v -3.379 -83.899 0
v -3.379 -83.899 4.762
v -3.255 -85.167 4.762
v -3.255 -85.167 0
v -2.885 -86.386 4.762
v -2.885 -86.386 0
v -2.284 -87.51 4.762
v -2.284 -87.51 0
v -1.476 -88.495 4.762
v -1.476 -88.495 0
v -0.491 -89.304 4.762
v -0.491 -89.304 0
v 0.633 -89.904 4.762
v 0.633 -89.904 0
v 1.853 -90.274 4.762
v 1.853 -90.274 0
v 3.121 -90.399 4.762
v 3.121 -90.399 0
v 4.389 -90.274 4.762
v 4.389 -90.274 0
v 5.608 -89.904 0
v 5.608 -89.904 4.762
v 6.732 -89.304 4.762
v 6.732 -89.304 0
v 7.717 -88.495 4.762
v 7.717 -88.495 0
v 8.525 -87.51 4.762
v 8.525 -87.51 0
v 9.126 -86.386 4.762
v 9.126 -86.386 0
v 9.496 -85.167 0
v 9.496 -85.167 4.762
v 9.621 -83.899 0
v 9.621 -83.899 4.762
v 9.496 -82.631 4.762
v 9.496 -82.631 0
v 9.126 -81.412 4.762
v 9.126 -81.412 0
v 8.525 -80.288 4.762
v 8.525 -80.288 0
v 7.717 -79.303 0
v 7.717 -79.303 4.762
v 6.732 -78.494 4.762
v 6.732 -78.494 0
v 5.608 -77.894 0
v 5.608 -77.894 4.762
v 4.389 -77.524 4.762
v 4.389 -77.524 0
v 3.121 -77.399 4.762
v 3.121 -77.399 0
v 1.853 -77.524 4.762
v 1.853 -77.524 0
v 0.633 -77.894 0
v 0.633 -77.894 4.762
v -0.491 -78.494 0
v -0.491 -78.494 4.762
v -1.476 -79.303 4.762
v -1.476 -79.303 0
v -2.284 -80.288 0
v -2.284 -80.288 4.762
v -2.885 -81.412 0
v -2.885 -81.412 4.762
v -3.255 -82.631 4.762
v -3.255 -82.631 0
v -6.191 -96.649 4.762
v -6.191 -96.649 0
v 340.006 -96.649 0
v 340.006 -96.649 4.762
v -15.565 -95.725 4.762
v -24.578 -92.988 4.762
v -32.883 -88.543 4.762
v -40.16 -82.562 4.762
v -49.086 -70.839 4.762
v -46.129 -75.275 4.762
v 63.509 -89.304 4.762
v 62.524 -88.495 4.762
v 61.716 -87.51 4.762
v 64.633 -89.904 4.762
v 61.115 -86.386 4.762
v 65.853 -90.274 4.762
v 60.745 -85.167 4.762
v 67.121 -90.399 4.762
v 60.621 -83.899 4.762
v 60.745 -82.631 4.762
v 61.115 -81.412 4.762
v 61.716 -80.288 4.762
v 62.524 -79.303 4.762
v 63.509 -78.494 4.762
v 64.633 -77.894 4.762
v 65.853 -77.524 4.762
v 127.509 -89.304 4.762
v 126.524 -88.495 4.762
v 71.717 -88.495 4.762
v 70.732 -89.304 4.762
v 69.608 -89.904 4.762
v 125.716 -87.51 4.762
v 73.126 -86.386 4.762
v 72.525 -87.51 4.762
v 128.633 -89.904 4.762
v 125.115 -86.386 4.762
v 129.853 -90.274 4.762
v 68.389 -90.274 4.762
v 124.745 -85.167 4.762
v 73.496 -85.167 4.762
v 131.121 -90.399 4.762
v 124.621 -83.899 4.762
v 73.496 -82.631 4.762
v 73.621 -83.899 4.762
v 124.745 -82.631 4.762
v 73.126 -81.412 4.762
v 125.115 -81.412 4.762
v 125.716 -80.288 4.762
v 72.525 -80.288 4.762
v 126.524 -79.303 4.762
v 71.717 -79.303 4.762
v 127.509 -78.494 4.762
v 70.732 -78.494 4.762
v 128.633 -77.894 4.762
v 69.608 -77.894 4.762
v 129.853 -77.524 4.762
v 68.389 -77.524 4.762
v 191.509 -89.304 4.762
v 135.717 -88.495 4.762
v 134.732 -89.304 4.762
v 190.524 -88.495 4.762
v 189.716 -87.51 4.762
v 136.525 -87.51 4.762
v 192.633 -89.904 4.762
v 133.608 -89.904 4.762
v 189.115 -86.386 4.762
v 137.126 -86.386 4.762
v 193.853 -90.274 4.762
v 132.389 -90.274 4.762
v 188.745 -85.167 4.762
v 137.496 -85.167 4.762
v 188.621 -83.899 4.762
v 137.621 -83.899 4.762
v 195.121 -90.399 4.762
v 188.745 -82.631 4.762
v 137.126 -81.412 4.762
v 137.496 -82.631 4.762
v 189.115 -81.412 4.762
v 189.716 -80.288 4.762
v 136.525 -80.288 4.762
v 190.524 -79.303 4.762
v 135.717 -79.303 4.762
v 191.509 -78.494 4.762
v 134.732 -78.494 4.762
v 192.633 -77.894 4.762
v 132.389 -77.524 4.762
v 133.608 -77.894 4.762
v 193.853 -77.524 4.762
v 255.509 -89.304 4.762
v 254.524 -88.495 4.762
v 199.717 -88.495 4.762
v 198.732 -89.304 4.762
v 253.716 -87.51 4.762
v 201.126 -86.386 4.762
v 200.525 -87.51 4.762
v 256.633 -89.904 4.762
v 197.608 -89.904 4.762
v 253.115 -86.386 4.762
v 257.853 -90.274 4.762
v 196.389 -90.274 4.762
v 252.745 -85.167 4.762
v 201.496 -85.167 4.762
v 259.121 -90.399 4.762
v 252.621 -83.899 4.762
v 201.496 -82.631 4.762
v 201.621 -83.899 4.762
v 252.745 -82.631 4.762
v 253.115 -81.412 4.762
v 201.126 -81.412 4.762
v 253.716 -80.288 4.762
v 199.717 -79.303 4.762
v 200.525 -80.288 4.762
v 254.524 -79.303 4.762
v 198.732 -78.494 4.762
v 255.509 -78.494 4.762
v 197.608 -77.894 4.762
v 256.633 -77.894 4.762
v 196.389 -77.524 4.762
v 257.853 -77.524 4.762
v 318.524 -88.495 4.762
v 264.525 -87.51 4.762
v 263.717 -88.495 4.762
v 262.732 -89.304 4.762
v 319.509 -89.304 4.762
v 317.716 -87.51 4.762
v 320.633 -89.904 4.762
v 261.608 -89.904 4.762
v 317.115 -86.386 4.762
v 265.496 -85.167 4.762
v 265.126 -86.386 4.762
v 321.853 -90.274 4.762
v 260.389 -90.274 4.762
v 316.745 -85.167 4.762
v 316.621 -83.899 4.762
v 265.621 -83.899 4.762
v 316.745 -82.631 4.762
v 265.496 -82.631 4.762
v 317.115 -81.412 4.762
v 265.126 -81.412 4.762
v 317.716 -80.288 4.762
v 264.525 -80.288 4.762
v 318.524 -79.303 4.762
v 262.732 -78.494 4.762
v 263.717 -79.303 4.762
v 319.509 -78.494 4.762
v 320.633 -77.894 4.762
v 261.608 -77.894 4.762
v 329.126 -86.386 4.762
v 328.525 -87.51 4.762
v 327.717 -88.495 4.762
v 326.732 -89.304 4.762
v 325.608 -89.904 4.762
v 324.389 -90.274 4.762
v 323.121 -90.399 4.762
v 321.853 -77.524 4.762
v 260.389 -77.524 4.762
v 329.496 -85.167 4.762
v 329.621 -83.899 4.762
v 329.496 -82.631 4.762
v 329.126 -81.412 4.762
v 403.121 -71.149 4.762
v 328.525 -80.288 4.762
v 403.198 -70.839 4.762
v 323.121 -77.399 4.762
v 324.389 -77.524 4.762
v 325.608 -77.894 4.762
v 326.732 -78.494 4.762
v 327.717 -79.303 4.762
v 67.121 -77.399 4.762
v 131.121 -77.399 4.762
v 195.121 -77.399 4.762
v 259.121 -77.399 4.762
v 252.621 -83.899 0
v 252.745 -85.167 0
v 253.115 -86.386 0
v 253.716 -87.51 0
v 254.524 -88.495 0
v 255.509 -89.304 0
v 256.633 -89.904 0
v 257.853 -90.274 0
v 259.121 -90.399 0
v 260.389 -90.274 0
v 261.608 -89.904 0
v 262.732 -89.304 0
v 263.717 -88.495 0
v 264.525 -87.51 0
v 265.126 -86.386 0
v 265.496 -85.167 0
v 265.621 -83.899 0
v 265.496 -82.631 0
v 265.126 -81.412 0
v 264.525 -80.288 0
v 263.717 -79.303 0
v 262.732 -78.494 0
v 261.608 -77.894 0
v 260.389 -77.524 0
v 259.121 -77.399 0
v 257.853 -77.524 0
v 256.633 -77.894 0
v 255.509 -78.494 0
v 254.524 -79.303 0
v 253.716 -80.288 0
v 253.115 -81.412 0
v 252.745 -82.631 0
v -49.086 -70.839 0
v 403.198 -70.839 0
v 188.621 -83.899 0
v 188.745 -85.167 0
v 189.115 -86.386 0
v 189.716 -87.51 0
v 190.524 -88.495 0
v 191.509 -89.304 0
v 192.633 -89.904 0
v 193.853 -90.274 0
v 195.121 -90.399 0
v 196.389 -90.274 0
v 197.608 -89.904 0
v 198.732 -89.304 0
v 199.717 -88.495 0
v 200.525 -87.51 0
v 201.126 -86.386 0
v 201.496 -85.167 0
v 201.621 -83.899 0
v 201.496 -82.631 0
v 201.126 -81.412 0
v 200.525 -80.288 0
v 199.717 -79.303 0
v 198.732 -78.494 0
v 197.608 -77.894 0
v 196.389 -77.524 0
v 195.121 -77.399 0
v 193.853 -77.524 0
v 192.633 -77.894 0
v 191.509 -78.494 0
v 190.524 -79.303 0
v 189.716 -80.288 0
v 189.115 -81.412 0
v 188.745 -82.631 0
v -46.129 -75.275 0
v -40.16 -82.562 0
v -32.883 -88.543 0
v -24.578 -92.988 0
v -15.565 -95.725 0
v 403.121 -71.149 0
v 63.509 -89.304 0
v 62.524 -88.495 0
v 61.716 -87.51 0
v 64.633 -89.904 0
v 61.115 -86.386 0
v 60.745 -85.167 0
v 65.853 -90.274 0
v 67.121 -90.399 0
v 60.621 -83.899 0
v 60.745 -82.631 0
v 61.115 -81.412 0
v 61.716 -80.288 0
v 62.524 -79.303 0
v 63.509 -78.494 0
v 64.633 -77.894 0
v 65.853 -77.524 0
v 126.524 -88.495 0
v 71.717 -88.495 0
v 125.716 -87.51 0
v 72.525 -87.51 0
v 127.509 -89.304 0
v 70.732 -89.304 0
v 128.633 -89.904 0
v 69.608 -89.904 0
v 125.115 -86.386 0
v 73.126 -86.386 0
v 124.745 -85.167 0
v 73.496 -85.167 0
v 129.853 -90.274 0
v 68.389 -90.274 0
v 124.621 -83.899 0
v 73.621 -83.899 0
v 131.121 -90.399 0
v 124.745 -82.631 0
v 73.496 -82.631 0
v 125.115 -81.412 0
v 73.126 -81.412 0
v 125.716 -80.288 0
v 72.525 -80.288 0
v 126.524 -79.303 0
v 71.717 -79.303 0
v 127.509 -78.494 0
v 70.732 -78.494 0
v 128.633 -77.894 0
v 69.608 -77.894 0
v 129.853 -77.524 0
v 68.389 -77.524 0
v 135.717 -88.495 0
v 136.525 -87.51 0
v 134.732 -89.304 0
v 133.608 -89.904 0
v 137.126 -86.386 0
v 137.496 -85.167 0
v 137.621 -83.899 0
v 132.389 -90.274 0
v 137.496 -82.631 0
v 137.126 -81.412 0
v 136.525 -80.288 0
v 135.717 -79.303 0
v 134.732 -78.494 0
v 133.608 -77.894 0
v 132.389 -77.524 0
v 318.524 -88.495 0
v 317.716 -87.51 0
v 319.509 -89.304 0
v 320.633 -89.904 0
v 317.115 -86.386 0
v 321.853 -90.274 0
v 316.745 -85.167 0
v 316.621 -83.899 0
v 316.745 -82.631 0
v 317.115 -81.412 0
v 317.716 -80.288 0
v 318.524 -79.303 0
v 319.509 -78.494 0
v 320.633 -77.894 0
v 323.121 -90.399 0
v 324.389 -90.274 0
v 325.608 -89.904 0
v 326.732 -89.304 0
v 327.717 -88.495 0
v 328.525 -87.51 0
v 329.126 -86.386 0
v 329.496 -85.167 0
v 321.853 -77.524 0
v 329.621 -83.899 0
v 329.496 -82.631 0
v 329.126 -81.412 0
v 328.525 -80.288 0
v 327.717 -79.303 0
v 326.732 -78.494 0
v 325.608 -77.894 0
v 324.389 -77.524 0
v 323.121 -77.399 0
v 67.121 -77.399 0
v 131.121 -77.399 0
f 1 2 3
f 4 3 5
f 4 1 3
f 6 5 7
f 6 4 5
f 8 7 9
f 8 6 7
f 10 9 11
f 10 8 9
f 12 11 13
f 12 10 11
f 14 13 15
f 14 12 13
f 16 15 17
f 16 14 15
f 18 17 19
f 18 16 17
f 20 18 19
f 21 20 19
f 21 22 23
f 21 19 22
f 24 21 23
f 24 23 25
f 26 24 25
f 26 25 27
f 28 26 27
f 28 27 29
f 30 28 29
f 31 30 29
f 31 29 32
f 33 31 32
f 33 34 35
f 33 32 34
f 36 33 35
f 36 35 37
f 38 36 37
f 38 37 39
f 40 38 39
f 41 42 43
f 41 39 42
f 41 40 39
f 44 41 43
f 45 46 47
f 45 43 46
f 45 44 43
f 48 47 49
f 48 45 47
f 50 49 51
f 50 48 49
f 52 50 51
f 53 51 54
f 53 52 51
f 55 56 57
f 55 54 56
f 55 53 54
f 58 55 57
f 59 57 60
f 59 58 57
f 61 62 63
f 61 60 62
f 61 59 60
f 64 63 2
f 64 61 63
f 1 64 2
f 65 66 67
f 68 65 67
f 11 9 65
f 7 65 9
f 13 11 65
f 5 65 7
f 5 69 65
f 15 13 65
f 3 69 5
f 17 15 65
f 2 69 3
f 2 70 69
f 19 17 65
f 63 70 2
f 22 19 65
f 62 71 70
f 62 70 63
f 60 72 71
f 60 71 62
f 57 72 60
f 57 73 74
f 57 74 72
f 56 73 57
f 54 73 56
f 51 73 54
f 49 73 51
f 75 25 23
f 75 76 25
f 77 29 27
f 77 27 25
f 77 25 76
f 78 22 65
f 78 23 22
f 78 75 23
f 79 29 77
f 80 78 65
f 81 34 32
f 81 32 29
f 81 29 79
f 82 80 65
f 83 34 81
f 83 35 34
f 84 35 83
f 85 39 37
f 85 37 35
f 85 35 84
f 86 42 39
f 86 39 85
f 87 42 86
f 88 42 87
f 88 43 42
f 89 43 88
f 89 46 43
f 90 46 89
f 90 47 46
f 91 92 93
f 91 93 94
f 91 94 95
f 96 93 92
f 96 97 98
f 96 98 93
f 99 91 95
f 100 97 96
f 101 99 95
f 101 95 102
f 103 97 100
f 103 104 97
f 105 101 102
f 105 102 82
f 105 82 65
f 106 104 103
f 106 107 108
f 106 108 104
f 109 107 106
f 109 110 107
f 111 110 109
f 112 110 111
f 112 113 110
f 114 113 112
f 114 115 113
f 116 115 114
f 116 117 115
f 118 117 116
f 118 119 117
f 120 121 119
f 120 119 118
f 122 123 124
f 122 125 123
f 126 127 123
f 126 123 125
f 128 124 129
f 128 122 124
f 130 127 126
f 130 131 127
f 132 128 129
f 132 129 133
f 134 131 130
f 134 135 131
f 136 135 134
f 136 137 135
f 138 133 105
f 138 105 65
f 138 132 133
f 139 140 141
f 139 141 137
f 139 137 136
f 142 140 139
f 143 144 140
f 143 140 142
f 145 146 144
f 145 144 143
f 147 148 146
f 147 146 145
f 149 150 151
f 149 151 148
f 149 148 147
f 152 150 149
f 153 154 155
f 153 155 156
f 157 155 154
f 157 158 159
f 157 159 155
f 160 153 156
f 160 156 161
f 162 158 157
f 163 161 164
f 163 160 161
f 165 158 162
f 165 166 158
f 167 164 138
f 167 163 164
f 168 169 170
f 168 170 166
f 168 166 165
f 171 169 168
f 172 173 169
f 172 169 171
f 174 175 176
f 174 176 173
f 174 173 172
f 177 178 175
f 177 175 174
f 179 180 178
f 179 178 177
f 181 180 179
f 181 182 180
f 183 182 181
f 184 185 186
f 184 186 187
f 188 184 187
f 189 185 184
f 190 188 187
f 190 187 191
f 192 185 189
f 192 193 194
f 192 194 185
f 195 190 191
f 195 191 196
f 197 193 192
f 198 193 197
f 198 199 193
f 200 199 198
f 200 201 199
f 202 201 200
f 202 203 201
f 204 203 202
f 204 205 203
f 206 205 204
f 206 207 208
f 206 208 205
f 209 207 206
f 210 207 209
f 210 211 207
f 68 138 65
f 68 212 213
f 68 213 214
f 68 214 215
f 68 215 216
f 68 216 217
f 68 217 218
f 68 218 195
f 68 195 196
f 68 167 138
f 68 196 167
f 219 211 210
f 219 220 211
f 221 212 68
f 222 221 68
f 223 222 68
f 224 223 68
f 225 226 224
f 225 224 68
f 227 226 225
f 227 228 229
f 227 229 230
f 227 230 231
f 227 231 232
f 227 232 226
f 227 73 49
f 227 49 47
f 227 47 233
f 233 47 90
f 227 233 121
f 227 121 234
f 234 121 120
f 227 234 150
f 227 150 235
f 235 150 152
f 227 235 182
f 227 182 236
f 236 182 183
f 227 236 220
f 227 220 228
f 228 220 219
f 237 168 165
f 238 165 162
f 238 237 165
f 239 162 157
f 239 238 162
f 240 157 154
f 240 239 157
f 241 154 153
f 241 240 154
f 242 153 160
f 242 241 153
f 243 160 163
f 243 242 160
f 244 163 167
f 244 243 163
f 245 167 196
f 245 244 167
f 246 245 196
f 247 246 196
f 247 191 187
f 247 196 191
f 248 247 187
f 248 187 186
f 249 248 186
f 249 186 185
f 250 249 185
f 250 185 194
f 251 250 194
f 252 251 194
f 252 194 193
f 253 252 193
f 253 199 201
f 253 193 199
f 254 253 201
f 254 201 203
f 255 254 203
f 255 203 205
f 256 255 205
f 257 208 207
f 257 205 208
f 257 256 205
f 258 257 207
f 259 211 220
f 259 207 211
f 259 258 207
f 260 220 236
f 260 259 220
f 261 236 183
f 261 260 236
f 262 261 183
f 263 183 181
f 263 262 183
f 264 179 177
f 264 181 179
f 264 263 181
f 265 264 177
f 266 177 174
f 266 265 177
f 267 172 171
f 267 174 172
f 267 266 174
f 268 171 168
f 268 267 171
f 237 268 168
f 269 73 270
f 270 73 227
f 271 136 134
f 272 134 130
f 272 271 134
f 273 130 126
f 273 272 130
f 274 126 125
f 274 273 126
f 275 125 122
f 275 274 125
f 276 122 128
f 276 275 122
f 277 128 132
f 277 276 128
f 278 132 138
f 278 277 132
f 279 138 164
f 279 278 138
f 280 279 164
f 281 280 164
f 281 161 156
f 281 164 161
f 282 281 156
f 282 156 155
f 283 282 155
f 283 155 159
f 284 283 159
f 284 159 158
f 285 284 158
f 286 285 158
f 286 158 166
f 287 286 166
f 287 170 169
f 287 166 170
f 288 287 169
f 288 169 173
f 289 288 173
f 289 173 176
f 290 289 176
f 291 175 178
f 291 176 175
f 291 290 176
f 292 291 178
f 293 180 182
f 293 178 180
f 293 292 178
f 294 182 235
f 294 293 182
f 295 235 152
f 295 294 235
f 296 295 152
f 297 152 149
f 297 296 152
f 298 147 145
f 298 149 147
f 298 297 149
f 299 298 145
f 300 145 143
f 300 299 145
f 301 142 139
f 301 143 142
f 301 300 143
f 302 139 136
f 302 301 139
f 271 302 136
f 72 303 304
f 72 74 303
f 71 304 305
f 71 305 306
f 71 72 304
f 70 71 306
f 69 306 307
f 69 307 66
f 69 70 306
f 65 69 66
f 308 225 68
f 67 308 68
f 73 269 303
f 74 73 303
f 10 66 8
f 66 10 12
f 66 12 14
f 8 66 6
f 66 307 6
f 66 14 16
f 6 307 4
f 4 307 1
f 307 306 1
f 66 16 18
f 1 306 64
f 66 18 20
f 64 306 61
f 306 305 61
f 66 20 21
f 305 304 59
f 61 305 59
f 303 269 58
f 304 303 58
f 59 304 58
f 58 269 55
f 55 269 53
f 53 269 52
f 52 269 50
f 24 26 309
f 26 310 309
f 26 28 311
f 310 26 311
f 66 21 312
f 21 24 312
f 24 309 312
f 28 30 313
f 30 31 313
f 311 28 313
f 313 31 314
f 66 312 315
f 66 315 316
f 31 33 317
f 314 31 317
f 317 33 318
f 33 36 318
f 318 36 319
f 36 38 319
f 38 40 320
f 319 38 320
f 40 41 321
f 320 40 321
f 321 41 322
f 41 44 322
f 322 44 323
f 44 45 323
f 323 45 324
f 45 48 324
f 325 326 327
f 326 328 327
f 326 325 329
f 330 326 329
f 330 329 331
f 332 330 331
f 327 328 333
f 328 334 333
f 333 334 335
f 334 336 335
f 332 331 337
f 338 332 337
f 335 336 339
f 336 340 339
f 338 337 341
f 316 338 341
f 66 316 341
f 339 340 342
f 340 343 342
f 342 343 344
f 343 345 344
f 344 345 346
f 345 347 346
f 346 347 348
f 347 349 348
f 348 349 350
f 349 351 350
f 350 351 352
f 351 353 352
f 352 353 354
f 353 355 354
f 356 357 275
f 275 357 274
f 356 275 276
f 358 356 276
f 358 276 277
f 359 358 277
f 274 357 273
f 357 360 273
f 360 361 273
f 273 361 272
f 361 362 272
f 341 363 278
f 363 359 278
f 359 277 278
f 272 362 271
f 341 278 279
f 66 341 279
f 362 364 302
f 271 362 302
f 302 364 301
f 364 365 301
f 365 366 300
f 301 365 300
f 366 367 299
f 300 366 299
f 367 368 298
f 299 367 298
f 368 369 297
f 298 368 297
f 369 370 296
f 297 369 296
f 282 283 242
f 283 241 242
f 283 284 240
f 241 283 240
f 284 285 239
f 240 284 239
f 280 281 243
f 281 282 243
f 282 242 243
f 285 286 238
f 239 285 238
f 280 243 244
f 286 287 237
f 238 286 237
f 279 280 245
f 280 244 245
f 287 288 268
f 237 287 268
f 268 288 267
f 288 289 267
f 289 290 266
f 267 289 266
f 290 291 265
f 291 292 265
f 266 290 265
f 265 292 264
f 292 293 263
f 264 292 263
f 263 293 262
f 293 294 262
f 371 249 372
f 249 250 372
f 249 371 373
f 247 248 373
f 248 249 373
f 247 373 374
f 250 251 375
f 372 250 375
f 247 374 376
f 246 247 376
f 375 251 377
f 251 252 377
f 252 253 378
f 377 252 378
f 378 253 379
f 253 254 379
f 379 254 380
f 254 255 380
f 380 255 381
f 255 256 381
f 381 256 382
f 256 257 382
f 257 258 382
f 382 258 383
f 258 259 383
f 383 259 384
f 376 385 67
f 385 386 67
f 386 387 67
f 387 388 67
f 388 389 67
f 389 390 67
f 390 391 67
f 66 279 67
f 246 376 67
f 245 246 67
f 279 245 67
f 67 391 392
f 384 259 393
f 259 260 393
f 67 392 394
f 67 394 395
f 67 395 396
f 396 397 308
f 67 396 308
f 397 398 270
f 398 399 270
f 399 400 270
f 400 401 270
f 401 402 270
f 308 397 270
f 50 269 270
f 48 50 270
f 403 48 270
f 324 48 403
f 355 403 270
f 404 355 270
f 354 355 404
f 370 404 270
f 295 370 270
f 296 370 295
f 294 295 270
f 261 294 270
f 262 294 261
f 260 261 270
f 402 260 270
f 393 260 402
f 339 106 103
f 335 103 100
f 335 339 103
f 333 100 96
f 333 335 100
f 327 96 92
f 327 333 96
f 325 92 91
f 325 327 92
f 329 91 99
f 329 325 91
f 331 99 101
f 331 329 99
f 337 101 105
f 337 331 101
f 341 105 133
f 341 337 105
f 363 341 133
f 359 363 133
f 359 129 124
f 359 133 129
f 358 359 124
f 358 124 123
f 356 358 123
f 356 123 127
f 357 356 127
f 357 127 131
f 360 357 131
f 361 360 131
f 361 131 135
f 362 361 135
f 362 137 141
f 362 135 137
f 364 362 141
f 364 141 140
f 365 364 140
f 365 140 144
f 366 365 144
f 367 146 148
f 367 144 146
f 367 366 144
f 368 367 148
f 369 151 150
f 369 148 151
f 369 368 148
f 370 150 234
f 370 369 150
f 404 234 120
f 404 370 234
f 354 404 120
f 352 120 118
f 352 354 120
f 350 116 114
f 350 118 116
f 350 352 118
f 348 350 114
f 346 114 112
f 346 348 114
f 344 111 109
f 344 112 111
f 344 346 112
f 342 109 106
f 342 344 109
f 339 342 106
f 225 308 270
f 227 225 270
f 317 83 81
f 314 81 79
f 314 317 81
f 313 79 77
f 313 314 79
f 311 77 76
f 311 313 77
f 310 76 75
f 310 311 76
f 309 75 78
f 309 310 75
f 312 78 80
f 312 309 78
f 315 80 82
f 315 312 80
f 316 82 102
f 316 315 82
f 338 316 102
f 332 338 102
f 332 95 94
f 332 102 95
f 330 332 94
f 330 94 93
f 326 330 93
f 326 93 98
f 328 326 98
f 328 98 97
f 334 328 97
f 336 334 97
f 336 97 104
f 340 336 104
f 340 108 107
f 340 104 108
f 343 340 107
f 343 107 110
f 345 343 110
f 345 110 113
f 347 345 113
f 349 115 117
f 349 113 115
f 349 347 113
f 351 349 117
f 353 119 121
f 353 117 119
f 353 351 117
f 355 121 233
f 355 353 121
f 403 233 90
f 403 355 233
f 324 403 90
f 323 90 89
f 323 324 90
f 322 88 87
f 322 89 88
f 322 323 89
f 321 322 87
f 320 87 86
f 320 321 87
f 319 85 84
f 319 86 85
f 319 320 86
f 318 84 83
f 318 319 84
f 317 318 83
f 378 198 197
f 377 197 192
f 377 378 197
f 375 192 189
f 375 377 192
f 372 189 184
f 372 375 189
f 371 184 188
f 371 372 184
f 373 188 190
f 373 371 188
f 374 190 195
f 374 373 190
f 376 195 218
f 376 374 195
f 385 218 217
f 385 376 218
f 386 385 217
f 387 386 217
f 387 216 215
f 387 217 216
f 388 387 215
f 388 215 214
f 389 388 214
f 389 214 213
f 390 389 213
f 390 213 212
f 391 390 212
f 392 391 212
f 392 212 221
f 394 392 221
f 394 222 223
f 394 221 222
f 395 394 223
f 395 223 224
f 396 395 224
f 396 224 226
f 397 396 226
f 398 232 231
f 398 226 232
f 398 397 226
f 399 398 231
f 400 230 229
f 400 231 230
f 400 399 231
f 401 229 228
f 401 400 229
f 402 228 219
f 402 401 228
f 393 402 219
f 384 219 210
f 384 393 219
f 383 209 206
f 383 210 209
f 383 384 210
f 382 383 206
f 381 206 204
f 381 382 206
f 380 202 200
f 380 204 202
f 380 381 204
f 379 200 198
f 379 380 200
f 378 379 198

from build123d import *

# Parameters (mm, degrees)
BOSS_EXTRUDE1_DEPTH = 4.7625
SKETCH1_4_R         = 6.5
CUT_EXTRUDE1_DEPTH  = 439.920211962
FILLET1_R           = 48
CUT_EXTRUDE3_DEPTH  = 10
CUT_EXTRUDE5_DEPTH  = 10


with BuildPart() as part:
    # Sketch1 → Boss-Extrude1 (new body)
    with BuildSketch(Plane.XY):
        Polygon((428.120588235, 28.939617947), (0.540381846, 28.939617947), (-115.605170134, 28.939617947), (-98.879411765, 3.850980392), (-31.879411765, -96.649019608), (366, -96.649019608), (403.120588235, -71.149019608), align=None)
    extrude(amount=BOSS_EXTRUDE1_DEPTH)

    # Sketch1<4> → Cut-Extrude1 (cut, through all)
    with BuildSketch(Plane.XY):
        with Locations((3.120588235, -83.899019608)):
            Circle(SKETCH1_4_R)
        with Locations((67.120588235, -83.899019608)):
            Circle(SKETCH1_4_R)
        with Locations((131.120588235, -83.899019608)):
            Circle(SKETCH1_4_R)
        with Locations((195.120588235, -83.899019608)):
            Circle(SKETCH1_4_R)
        with Locations((259.120588235, -83.899019608)):
            Circle(SKETCH1_4_R)
        with Locations((323.120588235, -83.899019608)):
            Circle(SKETCH1_4_R)
    extrude(amount=CUT_EXTRUDE1_DEPTH, mode=Mode.SUBTRACT)

    # Fillet1
    fillet1_edges = [part.edges().sort_by_distance(p)[0] for p in [
        (-31.879411765, -96.649019608, 2.38125),
    ]]
    fillet(fillet1_edges, radius=FILLET1_R)

    # Sketch7 → Cut-Extrude3 (cut)
    with BuildSketch(Plane.XY.offset(4.7625)):
        Polygon((403.120588235, -71.149019608), (340.005873473, -96.649019608), (366, -96.649019608), align=None)
    extrude(amount=-CUT_EXTRUDE3_DEPTH, mode=Mode.SUBTRACT)

    # Sketch11 → Cut-Extrude5 (cut)
    with BuildSketch(Plane.XY.offset(4.7625)):
        Polygon((-49.086078431, -70.839019608), (403.198019602, -70.839019608), (428.120588235, 28.939617947), (-115.605170134, 28.939617947), align=None)
    extrude(amount=-CUT_EXTRUDE5_DEPTH, mode=Mode.SUBTRACT)


solid = part.part
